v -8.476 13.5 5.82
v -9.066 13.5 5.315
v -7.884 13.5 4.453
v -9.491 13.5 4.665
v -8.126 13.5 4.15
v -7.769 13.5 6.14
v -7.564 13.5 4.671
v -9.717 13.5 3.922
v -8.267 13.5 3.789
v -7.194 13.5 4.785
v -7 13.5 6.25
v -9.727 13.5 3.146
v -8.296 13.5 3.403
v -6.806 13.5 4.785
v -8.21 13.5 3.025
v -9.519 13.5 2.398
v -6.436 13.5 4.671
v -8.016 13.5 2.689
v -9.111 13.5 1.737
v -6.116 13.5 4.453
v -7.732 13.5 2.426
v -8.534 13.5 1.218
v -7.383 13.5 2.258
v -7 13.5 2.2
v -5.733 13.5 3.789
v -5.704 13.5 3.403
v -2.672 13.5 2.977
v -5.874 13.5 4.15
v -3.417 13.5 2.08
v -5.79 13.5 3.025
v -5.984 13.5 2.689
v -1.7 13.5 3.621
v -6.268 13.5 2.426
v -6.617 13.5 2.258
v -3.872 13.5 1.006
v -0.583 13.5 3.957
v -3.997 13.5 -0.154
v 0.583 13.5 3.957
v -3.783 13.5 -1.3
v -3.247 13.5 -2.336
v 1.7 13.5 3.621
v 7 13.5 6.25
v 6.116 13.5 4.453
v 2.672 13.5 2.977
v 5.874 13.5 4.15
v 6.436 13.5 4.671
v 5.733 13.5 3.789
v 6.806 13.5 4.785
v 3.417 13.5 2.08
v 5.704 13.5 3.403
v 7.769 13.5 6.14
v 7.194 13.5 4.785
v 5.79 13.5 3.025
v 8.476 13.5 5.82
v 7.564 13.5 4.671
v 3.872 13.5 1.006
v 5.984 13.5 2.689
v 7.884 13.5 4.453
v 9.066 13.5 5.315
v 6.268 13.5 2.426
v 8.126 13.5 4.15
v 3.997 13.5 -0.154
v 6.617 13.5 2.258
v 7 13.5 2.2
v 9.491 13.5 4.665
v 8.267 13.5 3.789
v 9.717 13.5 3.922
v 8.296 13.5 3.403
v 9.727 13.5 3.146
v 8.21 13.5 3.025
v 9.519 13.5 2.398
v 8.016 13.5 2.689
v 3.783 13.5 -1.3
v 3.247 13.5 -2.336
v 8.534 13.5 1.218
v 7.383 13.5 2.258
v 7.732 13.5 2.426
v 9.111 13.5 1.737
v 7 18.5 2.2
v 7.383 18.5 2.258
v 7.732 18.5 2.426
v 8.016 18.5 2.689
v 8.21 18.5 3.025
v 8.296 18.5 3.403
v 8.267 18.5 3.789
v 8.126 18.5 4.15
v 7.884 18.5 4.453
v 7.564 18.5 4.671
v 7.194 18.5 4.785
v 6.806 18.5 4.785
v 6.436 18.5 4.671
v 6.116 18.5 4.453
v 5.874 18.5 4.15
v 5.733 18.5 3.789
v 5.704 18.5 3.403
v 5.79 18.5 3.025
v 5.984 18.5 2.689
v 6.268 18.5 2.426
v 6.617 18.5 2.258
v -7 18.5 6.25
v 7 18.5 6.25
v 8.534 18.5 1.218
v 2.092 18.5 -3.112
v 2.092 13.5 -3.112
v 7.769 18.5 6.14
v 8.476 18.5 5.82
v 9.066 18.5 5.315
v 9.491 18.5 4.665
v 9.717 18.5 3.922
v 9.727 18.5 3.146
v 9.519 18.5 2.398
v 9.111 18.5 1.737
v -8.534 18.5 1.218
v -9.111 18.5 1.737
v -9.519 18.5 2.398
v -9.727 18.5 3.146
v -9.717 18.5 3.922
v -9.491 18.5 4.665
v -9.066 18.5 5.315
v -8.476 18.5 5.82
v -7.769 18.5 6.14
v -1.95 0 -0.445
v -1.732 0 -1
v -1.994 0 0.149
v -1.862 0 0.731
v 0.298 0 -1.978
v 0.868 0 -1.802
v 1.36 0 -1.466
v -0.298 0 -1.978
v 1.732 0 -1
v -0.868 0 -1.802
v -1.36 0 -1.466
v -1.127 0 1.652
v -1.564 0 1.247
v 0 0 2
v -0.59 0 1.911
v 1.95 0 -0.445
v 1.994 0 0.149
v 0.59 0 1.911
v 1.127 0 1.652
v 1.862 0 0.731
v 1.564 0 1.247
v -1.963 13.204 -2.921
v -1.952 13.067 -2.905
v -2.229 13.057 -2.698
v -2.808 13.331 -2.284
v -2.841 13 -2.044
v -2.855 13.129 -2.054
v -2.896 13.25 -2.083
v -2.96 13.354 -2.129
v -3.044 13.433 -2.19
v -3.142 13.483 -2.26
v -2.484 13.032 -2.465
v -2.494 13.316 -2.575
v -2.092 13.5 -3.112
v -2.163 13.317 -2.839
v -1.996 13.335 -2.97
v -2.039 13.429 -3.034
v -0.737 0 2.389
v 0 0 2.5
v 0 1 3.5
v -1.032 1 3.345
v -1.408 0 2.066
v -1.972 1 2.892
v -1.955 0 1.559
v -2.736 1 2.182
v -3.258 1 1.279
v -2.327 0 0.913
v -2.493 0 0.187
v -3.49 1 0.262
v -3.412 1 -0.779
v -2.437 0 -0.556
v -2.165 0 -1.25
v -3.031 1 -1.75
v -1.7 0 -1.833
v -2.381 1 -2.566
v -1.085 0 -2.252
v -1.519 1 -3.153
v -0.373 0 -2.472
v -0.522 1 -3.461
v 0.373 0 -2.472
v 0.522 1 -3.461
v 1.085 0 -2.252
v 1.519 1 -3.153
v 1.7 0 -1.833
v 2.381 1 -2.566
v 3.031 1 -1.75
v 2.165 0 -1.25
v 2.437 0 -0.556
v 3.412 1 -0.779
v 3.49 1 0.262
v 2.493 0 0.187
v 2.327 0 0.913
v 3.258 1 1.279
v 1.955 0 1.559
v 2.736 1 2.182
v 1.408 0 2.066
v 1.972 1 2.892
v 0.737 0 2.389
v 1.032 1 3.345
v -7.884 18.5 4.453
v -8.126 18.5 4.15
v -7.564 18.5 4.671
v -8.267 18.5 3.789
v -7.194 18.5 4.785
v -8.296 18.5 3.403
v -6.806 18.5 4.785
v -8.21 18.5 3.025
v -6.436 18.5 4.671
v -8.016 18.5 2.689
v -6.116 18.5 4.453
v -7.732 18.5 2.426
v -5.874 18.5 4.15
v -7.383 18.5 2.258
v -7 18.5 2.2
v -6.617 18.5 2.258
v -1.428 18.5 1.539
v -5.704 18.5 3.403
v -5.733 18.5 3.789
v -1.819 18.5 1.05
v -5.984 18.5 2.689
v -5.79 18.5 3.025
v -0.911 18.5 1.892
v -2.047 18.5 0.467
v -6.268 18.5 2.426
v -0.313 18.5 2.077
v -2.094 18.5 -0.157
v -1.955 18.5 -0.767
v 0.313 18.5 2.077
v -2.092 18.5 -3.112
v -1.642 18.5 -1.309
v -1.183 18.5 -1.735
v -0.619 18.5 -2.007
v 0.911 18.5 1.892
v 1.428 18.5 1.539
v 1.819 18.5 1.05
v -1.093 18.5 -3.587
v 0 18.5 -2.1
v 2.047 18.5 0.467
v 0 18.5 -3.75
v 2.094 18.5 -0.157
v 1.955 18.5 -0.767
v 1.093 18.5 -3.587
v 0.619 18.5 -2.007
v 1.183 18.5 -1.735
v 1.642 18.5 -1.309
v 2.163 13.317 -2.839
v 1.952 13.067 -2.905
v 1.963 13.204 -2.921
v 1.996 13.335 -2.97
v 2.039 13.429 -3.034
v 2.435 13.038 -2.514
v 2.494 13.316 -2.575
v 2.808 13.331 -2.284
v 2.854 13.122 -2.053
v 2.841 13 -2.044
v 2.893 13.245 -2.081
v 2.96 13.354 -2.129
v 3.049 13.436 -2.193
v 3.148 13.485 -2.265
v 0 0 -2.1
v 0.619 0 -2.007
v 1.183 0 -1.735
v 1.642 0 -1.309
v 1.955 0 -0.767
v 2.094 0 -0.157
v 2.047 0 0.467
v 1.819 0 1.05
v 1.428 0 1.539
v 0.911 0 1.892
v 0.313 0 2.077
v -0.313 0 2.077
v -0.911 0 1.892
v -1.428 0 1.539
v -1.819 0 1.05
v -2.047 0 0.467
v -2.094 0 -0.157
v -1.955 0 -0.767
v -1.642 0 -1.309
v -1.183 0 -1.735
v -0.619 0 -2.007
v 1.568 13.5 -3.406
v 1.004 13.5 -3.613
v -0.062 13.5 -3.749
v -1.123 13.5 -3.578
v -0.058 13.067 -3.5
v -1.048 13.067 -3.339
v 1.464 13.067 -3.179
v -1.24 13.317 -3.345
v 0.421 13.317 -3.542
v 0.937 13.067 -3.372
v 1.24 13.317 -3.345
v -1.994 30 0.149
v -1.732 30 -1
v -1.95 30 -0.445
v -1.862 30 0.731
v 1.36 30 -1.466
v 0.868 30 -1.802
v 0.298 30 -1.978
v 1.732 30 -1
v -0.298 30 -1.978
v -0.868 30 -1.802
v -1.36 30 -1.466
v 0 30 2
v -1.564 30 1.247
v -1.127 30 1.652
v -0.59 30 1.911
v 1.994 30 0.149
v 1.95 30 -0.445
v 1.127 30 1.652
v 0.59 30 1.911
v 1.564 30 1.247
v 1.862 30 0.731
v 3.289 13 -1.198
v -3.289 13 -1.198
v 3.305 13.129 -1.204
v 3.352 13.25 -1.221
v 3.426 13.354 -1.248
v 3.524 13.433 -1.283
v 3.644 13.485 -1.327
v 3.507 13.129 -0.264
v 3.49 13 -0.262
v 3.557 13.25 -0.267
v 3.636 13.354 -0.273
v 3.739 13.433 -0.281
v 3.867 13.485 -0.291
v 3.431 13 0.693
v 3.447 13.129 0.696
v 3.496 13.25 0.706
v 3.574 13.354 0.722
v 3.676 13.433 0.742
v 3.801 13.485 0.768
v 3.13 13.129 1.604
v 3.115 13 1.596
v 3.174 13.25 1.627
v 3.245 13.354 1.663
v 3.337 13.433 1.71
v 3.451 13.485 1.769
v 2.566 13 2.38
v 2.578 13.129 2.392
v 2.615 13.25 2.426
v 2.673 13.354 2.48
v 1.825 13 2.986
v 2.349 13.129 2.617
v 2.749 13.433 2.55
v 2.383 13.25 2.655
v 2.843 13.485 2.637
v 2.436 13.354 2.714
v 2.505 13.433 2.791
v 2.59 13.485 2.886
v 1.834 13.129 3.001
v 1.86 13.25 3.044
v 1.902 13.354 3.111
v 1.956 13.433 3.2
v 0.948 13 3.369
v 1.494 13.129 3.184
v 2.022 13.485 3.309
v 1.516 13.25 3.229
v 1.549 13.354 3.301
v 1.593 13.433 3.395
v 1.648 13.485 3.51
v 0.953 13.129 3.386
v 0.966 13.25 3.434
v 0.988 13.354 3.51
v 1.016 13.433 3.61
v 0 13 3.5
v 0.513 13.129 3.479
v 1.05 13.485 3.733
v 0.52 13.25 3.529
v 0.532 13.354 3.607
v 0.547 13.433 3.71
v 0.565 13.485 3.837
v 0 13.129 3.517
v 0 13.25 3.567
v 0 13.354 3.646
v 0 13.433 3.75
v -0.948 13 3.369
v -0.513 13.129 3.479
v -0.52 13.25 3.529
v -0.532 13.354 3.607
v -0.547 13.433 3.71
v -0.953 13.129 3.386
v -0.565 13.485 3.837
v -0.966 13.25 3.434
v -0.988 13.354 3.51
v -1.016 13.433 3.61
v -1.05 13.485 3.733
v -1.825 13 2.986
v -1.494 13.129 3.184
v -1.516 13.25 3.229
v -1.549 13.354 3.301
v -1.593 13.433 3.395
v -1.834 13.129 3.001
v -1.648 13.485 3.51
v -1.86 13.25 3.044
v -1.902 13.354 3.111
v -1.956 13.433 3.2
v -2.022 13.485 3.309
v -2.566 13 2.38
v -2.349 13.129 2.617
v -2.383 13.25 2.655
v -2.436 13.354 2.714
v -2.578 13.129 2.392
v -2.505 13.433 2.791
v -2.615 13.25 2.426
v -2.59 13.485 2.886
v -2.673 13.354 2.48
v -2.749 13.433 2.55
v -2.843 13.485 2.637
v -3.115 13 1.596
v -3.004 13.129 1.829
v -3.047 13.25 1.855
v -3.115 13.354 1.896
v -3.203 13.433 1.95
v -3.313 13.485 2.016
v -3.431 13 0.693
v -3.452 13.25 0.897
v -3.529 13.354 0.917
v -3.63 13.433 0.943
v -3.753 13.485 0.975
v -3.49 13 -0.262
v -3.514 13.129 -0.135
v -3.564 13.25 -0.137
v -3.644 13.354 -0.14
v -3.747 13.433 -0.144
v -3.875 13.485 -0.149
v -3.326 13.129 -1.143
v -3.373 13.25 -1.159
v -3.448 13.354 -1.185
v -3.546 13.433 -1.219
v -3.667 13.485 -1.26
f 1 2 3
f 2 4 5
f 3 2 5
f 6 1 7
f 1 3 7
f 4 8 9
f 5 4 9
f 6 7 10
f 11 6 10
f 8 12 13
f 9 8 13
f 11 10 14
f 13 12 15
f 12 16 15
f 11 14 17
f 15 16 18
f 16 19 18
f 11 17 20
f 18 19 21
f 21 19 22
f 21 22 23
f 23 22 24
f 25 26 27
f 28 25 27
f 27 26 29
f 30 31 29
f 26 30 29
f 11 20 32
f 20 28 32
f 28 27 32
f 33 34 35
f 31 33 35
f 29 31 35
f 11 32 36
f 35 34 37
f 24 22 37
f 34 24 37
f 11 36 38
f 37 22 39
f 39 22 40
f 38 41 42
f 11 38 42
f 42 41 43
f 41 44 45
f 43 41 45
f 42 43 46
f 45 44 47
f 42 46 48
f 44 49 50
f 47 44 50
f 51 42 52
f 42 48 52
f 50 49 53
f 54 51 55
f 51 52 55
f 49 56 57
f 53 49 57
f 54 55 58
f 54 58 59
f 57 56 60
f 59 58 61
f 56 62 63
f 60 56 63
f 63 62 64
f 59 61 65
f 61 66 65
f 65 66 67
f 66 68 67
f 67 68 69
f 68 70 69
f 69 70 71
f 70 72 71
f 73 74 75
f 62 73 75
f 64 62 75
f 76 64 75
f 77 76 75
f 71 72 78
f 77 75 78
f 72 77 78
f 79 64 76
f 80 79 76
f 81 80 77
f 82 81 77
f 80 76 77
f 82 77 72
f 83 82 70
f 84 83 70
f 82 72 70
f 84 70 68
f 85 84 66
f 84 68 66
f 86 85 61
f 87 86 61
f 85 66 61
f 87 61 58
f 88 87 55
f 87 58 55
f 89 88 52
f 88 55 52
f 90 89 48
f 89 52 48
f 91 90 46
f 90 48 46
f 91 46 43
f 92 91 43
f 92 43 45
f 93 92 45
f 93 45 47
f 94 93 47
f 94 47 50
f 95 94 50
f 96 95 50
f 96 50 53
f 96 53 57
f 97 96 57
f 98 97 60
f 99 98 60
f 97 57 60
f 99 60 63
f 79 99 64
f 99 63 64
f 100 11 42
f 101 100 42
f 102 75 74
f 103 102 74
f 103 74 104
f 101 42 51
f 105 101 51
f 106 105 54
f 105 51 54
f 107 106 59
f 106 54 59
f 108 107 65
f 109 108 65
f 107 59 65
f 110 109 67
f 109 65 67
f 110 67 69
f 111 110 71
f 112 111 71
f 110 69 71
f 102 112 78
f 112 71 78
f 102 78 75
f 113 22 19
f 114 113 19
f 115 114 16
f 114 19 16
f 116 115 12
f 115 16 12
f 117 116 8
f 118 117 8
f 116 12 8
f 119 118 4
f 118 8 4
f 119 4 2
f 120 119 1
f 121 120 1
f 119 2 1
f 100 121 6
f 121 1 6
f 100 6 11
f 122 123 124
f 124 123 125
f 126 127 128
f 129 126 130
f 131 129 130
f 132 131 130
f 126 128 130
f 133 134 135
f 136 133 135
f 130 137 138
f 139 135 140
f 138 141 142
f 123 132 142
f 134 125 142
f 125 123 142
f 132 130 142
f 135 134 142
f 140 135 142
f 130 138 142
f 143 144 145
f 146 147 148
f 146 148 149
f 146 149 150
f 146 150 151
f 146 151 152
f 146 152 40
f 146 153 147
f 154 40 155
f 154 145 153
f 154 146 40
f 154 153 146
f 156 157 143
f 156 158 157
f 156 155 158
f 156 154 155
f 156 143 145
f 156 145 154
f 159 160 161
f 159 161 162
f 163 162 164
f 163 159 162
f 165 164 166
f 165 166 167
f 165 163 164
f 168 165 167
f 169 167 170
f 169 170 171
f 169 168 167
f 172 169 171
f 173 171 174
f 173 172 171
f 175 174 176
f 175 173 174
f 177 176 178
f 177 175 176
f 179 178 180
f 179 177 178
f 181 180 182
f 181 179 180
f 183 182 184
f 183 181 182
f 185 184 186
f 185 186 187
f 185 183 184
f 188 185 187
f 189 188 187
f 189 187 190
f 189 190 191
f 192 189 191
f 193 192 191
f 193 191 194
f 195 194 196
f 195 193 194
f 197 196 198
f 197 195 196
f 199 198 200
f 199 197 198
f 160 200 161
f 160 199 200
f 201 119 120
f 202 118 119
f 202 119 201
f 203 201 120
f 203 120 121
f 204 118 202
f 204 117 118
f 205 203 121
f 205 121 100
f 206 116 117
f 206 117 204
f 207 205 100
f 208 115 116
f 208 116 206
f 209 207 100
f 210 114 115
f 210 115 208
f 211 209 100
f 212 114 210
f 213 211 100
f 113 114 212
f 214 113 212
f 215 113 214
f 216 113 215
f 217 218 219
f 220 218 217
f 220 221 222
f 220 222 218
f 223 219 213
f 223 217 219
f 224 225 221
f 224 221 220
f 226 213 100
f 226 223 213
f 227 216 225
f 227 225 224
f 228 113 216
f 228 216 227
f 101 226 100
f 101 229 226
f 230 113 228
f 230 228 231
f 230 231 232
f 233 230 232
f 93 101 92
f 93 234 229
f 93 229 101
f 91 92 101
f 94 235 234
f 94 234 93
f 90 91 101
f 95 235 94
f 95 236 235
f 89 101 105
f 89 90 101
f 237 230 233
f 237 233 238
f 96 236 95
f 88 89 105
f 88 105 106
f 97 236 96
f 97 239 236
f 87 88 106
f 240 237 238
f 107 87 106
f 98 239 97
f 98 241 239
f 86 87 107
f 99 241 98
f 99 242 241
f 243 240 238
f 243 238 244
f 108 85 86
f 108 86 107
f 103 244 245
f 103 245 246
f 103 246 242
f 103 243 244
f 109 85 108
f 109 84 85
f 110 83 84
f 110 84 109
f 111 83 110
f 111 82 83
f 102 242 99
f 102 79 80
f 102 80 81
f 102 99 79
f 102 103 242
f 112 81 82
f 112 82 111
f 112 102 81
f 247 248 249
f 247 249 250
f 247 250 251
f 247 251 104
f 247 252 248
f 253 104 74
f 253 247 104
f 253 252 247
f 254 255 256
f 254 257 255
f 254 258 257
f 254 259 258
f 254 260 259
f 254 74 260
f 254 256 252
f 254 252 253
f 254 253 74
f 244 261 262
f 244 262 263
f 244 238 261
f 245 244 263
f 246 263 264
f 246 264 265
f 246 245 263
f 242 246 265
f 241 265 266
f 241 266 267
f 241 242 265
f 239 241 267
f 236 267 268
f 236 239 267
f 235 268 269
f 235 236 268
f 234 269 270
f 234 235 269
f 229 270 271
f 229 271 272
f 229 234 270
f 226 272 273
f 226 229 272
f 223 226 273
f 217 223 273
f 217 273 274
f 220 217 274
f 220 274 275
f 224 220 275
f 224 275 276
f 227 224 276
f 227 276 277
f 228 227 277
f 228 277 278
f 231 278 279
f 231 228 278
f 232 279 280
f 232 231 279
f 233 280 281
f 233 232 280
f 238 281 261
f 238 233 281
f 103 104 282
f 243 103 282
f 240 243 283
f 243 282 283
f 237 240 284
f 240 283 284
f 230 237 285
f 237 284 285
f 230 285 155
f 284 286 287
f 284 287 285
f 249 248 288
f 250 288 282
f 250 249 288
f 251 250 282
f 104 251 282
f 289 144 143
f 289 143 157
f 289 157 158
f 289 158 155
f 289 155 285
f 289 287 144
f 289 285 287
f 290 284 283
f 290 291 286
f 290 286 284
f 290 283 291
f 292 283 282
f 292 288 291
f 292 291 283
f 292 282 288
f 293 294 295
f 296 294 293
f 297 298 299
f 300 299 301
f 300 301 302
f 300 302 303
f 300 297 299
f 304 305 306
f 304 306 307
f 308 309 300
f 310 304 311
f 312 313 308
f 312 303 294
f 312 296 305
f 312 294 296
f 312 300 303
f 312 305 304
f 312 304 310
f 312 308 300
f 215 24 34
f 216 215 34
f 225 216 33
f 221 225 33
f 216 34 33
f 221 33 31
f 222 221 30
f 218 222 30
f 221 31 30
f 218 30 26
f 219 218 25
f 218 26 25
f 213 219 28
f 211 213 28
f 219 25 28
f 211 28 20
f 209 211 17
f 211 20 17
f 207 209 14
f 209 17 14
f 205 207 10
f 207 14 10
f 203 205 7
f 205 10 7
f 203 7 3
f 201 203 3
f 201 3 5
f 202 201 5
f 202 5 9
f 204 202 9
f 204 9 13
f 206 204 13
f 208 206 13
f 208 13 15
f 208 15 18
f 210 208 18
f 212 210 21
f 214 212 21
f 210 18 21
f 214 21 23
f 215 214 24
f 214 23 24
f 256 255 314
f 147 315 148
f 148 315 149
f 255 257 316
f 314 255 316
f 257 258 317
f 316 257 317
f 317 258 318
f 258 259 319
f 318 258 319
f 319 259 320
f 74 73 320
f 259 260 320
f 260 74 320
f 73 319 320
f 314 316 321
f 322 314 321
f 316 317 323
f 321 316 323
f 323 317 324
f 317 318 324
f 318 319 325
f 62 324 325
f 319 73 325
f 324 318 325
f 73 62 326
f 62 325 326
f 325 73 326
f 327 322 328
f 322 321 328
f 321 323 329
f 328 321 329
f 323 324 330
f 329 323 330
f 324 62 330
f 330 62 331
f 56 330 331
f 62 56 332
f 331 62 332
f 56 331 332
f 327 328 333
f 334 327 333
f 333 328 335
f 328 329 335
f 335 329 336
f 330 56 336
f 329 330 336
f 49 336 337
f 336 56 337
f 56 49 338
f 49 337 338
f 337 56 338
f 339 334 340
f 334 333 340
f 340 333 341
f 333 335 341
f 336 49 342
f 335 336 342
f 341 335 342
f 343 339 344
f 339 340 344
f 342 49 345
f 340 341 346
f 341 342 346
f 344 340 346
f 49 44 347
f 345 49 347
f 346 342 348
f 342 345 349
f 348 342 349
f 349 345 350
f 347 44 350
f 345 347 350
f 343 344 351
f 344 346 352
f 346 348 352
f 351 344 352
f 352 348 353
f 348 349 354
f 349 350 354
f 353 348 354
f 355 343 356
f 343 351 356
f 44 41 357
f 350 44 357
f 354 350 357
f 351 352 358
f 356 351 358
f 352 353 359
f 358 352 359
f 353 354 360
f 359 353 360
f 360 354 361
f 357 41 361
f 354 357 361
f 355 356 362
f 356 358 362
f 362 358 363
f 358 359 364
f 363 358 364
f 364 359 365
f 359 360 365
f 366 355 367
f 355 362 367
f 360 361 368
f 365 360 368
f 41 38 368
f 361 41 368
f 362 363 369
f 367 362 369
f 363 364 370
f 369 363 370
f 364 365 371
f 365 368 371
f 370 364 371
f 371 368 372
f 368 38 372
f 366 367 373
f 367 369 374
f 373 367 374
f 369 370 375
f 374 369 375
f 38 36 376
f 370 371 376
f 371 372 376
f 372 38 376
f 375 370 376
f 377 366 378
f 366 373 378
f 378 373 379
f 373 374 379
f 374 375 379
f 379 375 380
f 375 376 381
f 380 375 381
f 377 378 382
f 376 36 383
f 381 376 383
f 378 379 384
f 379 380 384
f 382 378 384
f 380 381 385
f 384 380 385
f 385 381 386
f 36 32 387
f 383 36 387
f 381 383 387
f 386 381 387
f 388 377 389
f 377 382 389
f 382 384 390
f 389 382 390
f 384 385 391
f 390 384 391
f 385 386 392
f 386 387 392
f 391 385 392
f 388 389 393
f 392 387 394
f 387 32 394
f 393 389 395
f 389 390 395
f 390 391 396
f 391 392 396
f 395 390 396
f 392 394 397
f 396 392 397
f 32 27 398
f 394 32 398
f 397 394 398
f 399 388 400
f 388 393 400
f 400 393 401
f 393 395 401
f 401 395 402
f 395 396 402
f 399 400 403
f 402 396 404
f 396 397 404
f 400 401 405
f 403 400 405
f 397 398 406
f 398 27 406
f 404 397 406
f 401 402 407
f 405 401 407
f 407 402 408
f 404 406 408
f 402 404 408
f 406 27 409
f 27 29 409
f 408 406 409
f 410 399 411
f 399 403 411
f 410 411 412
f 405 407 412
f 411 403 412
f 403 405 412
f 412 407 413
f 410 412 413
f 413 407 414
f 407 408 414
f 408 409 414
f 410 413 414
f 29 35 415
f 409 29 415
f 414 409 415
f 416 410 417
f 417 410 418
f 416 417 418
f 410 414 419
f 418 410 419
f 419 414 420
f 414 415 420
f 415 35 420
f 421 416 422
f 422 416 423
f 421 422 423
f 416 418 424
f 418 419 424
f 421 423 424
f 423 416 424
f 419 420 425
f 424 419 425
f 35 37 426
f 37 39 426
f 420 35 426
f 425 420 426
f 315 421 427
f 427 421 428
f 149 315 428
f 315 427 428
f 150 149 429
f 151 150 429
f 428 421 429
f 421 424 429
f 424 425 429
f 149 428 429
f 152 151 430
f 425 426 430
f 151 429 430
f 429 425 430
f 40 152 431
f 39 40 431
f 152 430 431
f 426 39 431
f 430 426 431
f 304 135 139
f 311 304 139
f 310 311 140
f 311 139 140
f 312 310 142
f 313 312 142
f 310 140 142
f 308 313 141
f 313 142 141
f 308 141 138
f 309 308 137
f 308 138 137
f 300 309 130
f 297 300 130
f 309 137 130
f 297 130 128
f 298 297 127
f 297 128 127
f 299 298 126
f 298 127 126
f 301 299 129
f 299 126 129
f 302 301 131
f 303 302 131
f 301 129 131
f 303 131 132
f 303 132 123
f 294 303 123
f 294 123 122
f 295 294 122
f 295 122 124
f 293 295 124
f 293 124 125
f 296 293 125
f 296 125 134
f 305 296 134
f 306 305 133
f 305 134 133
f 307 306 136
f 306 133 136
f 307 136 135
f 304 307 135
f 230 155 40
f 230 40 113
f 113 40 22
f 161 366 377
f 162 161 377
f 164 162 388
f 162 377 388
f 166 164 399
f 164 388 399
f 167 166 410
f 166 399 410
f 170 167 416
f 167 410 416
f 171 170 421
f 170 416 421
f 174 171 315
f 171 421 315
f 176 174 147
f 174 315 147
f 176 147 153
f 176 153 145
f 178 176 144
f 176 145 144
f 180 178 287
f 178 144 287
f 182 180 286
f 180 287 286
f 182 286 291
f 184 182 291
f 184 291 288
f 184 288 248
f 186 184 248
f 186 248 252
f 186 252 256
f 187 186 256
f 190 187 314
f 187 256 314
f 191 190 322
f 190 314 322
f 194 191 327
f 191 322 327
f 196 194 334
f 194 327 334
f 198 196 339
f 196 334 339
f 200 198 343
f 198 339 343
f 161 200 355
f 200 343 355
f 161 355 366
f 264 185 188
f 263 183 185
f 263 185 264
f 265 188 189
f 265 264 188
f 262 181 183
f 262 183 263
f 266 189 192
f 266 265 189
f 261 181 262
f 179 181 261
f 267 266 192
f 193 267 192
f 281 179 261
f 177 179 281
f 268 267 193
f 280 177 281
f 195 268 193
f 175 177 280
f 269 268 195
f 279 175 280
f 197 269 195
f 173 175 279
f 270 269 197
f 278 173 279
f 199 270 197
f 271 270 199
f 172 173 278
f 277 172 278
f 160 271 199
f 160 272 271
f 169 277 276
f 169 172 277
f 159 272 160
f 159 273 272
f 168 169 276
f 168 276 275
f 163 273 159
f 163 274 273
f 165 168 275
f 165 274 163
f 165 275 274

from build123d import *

# Parameters (mm, degrees)
SKETCH_1_R      = 2
EXTRUDE_1_DEPTH = 30
SKETCH_2_R      = 1.3
SKETCH_2_R_2    = 2.1
EXTRUDE_2_DEPTH = 5
SKETCH_3_R      = 3.5
SKETCH_3_R_2    = 2.1
EXTRUDE_4_DEPTH = 13.5
CHAMFER_2_SIZE  = 1
FILLET_2_R      = 0.5


with BuildPart() as part:
    # 草图1 → 凸台-拉伸1 (new body)
    with BuildSketch(Plane(origin=(0, 0, 0), x_dir=(1, 0, 0), z_dir=(0, 1, 0))):
        with Locations(Location((0, 0, 0), (0, 0, 270))):
            Circle(SKETCH_1_R)
    extrude(amount=EXTRUDE_1_DEPTH)


with BuildPart() as body_2:
    # 草图2 → 凸台-拉伸2 (new body)
    with BuildSketch(Plane(origin=(0, 13.5, 0), x_dir=(-1, 0, 0), z_dir=(0, -1, 0))):
        with BuildLine():
            Line((-8.534042298, -1.217629691), (-2.09187586, 3.112323149))
            ThreePointArc((-2.09187586, 3.112323149), (0, 3.75), (2.09187586, 3.112323149))
            Line((2.09187586, 3.112323149), (8.534042298, -1.217629691))
            ThreePointArc((8.534042298, -1.217629691), (9.630495994, -4.301867087), (7, -6.25))
            Line((7, -6.25), (-7, -6.25))
            ThreePointArc((-7, -6.25), (-9.630495994, -4.301867087), (-8.534042298, -1.217629691))
        make_face()
        with Locations(Location((-7, -3.5, 0), (0, 0, 90))):
            Circle(SKETCH_2_R, mode=Mode.SUBTRACT)
        with Locations(Location((7, -3.5, 0), (0, 0, 90))):
            Circle(SKETCH_2_R, mode=Mode.SUBTRACT)
        with Locations(Location((0, 0, 0), (0, 0, 90))):
            Circle(SKETCH_2_R_2, mode=Mode.SUBTRACT)
    extrude(amount=-EXTRUDE_2_DEPTH)

    # 草图3 → 凸台-拉伸4 (add)
    with BuildSketch(Plane.XZ.offset(-13.5)):
        with Locations(Location((0, 0, 0), (0, 0, 90))):
            Circle(SKETCH_3_R)
        with Locations(Location((0, 0, 0), (0, 0, 270))):
            Circle(SKETCH_3_R_2, mode=Mode.SUBTRACT)
    extrude(amount=EXTRUDE_4_DEPTH)

    # 倒角2
    chamfer_2_edges = [body_2.edges().sort_by_distance(p)[0] for p in [
        (0, 0, -3.5),
    ]]
    chamfer(chamfer_2_edges, length=CHAMFER_2_SIZE)

    # 圆角2
    fillet_2_edges = [body_2.edges().sort_by_distance(p)[0] for p in [
        (0, 13.5, -3.5),
    ]]
    fillet(fillet_2_edges, radius=FILLET_2_R)


solid = Compound([part.part, body_2.part])
